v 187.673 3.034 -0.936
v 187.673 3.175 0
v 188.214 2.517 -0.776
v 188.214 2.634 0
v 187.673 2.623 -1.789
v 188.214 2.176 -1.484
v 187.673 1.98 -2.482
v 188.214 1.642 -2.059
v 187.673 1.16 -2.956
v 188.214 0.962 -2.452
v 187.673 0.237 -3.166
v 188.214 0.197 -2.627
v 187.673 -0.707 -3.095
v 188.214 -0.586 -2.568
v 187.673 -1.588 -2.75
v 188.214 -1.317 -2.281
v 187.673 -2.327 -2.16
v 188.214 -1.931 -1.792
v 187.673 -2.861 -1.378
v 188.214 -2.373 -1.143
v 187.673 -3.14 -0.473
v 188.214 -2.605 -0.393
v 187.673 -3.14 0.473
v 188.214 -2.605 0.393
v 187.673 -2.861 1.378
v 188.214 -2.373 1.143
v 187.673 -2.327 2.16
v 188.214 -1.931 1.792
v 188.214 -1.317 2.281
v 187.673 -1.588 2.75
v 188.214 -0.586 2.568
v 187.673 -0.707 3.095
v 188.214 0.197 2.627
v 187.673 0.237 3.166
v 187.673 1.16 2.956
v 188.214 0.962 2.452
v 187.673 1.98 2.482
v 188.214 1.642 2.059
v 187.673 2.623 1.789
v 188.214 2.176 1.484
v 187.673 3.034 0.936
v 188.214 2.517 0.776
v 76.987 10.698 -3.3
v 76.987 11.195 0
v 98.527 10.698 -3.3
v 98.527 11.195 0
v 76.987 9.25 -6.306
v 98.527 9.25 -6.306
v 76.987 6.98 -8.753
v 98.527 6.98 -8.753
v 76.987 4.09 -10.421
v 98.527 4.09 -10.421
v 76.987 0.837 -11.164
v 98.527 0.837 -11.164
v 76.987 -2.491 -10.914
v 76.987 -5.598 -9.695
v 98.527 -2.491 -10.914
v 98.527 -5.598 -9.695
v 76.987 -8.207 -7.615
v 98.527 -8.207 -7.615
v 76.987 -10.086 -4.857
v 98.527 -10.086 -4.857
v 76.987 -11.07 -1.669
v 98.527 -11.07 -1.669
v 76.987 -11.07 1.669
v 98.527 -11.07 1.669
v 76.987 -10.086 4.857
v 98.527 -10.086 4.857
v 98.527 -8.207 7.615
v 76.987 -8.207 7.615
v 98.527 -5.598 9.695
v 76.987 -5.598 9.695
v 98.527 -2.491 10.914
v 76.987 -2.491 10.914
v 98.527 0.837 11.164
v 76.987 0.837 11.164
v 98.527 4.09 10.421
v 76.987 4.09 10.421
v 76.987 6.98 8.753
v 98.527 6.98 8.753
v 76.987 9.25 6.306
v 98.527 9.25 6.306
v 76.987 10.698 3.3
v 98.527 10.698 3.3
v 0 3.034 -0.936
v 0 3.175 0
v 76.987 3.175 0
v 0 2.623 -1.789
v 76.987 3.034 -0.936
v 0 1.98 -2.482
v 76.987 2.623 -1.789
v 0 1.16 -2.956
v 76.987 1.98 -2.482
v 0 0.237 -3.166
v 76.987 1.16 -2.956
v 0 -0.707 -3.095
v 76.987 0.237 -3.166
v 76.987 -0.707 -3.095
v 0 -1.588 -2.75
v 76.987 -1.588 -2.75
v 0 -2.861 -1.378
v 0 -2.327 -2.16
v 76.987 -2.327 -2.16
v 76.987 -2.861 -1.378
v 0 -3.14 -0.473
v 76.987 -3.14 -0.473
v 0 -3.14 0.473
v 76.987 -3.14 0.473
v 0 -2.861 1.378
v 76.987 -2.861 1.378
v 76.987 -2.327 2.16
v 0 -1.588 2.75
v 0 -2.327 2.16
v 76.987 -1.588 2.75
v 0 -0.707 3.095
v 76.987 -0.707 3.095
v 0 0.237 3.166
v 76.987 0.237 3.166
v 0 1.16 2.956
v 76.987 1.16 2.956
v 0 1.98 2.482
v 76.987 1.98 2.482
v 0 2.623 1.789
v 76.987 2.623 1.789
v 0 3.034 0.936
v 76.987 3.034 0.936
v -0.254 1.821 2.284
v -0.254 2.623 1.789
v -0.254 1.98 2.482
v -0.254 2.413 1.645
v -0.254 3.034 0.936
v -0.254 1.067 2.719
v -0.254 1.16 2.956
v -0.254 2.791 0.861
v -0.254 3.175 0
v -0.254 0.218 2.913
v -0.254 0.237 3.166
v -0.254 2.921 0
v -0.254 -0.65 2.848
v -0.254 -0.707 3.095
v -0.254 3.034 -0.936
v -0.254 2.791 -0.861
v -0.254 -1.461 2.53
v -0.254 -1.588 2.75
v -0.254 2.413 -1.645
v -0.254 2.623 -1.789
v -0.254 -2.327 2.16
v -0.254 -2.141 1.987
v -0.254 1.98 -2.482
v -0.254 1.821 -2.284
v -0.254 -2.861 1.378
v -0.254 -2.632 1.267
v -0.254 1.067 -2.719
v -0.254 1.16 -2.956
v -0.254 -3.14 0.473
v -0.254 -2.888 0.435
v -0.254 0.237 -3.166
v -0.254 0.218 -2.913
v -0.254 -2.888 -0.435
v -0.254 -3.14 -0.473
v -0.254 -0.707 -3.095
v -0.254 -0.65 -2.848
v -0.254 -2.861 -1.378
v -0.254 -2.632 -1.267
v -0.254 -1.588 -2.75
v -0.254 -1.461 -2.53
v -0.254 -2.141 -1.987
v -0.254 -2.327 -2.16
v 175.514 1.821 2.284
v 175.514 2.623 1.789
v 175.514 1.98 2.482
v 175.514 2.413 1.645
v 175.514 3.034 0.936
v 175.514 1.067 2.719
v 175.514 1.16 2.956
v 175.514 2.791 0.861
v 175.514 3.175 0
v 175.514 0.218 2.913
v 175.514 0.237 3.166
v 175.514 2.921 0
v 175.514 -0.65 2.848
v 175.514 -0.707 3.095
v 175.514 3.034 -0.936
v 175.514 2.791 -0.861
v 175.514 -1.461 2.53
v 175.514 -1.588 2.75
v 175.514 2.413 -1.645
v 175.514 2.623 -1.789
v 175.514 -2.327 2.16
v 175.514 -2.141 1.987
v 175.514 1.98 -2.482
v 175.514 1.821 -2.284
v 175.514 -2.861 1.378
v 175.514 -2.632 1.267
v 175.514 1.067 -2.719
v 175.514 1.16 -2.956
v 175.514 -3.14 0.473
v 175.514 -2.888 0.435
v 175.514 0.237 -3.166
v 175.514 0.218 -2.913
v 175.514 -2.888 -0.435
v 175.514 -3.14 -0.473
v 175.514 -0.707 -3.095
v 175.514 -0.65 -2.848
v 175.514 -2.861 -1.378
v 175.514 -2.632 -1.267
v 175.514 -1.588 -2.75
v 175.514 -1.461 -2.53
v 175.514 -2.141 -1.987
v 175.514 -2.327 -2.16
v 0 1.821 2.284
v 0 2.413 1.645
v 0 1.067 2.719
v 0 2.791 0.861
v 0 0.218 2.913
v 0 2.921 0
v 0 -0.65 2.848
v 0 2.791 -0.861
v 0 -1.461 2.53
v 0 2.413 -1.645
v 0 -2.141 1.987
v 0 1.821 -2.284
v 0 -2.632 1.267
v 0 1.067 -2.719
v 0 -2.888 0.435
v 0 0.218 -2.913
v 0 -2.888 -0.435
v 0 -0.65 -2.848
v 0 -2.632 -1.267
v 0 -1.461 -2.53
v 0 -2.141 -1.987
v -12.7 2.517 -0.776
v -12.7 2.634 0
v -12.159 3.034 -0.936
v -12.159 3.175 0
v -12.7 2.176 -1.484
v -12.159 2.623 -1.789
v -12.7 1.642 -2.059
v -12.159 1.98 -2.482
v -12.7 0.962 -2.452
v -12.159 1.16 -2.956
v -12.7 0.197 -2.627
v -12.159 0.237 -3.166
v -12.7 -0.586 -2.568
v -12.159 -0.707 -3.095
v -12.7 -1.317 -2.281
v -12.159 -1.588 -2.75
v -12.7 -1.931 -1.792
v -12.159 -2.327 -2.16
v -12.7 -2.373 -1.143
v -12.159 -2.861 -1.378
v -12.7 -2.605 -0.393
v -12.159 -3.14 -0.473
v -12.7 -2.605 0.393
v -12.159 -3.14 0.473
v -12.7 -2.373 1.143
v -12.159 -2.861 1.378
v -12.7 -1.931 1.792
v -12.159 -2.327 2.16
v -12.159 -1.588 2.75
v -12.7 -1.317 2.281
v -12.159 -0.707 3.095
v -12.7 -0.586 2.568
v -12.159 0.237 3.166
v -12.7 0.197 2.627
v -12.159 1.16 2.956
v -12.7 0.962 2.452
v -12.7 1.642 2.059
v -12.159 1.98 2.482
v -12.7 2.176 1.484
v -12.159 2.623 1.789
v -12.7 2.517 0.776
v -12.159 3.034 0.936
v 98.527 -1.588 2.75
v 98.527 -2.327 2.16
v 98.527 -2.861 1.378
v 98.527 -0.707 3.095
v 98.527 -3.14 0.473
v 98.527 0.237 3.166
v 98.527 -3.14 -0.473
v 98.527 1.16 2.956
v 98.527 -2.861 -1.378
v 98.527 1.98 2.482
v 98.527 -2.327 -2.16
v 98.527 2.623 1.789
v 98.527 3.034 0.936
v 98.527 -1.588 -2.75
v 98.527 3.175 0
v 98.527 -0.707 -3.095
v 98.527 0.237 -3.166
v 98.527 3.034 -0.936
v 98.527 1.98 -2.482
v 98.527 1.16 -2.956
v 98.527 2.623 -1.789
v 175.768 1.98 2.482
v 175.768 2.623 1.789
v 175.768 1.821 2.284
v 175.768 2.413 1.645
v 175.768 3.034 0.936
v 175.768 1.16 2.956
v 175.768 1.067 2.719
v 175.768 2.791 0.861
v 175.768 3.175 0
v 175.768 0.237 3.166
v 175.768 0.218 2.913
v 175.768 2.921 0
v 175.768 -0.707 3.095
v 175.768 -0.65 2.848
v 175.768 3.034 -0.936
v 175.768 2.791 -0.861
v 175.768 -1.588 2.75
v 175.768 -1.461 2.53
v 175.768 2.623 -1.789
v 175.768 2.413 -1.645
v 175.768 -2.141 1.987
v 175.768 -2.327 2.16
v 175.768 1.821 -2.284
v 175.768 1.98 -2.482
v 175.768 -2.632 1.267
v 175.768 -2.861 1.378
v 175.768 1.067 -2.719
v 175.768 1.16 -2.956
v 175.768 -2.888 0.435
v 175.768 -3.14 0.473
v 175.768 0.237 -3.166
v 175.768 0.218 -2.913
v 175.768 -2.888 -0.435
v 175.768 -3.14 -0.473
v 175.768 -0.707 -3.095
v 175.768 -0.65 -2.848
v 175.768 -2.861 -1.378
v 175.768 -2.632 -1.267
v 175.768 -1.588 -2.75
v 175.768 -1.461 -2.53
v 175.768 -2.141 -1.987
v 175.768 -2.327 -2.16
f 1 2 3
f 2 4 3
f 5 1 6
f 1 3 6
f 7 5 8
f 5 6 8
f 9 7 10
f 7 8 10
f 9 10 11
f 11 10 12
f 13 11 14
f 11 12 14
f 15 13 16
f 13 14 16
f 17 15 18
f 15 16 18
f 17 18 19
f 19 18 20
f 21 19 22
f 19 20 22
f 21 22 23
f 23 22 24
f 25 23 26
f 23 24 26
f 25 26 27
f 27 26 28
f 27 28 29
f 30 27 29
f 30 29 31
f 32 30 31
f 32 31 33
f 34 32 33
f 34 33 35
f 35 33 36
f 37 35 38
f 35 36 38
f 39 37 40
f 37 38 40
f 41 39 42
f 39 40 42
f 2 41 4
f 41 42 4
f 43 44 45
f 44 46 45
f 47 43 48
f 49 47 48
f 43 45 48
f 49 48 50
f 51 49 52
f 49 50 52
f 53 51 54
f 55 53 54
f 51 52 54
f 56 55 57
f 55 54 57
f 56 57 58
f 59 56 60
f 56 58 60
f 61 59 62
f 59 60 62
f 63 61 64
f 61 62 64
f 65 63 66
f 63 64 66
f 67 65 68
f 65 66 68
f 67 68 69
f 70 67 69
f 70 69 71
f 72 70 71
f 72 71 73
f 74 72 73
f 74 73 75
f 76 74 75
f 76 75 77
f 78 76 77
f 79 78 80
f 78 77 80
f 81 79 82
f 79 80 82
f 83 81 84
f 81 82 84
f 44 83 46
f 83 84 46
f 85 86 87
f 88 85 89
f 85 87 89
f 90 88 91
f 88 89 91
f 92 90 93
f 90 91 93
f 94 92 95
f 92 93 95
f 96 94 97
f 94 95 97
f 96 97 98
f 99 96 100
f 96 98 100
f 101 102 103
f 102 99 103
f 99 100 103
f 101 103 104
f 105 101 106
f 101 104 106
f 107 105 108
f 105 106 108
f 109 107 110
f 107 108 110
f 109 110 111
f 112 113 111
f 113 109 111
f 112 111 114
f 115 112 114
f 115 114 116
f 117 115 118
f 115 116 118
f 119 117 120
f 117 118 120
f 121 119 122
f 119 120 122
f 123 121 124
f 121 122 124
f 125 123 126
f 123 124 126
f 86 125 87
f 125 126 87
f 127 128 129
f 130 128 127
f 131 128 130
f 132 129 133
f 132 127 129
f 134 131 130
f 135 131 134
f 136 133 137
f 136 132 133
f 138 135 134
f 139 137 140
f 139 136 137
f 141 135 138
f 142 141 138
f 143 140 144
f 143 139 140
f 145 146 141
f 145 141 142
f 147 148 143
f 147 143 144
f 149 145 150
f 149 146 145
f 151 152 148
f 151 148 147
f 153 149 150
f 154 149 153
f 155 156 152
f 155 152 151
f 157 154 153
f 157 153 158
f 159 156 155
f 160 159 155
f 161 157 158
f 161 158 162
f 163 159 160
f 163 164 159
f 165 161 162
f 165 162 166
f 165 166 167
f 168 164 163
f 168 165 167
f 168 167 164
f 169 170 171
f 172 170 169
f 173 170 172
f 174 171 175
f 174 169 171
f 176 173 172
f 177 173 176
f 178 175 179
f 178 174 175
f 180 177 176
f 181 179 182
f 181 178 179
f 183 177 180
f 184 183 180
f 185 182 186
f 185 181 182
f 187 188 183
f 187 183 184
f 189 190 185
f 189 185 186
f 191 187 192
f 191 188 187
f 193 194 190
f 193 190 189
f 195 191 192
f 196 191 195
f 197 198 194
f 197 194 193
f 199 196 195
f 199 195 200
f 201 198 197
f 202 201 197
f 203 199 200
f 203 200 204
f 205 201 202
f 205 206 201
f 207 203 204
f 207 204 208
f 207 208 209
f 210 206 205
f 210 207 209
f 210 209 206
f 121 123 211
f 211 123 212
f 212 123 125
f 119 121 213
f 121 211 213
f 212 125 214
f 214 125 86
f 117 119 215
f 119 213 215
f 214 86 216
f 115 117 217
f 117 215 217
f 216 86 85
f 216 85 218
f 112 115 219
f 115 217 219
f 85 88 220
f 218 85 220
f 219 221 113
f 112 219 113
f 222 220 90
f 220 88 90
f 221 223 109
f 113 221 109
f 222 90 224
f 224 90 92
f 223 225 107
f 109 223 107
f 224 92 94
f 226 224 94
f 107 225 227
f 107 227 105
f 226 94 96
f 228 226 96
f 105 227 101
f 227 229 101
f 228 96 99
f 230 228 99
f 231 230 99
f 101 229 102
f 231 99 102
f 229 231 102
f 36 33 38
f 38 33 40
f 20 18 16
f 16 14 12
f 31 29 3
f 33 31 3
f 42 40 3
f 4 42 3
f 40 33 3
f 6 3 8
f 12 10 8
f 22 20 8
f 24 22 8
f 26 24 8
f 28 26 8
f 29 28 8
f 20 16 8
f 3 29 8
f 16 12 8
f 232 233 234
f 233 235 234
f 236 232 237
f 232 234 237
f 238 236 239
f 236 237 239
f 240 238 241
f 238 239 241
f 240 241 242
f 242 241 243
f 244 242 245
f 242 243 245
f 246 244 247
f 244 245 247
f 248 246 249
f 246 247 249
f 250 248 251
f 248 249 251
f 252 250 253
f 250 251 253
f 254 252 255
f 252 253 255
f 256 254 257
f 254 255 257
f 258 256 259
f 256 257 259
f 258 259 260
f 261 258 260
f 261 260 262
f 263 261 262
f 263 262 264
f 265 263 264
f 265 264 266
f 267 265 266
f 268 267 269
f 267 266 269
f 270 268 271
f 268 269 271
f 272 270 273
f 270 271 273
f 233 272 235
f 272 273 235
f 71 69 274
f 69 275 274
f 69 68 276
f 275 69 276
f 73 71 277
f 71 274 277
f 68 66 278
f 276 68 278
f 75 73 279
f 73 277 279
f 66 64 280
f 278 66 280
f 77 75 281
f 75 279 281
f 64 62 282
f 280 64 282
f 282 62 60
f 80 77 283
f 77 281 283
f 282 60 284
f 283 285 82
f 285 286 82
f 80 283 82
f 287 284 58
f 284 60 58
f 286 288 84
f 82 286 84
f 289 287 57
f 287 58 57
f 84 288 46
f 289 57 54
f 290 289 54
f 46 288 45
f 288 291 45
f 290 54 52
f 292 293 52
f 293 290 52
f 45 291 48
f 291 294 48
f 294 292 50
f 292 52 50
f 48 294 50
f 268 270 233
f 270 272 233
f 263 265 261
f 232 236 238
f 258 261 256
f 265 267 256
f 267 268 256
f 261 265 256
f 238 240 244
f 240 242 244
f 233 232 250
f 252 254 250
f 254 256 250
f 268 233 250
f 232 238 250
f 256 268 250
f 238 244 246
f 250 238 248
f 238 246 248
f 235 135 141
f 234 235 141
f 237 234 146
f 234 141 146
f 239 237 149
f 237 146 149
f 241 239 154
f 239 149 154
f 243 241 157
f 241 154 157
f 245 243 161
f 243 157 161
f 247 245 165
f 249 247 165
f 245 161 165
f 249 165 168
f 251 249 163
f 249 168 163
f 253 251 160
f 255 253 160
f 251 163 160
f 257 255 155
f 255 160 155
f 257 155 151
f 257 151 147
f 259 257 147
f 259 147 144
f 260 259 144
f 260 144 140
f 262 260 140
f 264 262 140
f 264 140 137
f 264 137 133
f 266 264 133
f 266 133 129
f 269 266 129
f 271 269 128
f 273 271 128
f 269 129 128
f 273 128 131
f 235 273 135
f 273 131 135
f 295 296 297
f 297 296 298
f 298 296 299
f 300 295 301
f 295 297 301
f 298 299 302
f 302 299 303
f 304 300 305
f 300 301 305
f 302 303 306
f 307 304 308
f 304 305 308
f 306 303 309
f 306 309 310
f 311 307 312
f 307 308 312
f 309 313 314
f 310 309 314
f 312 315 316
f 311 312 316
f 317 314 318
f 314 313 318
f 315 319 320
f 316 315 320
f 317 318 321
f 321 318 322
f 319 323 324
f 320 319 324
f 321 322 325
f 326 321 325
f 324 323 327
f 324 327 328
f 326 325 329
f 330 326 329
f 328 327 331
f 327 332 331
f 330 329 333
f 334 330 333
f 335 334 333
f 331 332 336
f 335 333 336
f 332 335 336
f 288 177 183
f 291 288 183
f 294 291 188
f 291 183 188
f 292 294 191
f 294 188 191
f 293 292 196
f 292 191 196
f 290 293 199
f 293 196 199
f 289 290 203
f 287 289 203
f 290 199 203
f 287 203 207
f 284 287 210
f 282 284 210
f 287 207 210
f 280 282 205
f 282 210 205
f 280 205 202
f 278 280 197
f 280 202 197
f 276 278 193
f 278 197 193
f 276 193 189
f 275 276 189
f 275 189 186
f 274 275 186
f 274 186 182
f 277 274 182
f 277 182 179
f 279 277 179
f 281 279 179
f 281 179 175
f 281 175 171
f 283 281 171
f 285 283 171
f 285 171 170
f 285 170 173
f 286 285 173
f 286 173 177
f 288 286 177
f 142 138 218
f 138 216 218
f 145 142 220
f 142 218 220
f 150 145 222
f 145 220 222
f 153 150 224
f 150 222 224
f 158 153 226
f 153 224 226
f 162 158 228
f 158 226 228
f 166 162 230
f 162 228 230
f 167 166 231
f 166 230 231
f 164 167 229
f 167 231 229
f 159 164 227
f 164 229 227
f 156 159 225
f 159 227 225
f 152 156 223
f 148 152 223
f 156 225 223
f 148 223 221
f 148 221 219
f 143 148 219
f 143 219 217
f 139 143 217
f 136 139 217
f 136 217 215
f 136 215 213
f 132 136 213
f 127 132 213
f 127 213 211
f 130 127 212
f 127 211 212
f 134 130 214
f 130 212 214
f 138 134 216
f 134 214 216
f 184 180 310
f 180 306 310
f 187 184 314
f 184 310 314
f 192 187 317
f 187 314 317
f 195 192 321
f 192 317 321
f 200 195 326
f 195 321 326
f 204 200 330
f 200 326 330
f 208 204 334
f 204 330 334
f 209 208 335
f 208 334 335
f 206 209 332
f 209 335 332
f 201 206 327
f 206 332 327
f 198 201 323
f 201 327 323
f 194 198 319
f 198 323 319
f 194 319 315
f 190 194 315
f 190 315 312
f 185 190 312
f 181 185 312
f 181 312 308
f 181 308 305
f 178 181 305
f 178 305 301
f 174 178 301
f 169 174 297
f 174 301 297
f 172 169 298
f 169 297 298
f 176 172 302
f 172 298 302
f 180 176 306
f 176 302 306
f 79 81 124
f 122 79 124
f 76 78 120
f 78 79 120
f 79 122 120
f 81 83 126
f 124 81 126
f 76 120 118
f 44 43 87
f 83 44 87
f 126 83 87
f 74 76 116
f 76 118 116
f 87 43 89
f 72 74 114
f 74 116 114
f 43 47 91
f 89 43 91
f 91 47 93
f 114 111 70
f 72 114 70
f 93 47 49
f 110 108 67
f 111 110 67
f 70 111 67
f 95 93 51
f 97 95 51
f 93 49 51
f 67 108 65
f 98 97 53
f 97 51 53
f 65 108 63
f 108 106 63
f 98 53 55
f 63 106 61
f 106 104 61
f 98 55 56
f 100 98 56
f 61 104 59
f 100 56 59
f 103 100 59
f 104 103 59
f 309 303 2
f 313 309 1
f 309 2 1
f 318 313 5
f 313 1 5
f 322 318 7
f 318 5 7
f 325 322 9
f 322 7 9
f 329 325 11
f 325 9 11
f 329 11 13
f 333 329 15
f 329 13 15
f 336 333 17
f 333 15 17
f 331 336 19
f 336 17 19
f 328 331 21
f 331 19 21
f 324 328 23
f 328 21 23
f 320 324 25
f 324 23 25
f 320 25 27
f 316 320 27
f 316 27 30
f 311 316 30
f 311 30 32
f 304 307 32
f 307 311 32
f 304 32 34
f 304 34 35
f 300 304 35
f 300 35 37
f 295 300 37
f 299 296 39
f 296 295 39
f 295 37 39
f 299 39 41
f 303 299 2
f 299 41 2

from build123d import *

# Parameters (mm, degrees)
SKETCH3_W = 76.9874
SKETCH3_H = 3.175
SKETCH5_W = 0.254
SKETCH5_H = 0.508
SKETCH6_W = 0.254
SKETCH6_H = 0.508


with BuildPart() as part:
    # Sketch1 → Revolve1 (revolve)
    with BuildSketch(Plane.XY):
        Polygon((0, 0), (0, 3.175), (76.9874, 3.175), (76.9874, 11.19505), (98.5266, 11.19505), (98.5266, 0), align=None)
    revolve(axis=Axis((98.5266, 0, 0), (-1, 0, 0)))

    # Sketch2 → Revolve2 (revolve)
    with BuildSketch(Plane.XY):
        Polygon((-12.7, 0), (-12.7, 2.63398), (-12.15898, 3.175), (0, 3.175), (0, 0), align=None)
    revolve(axis=Axis((0, 0, 0), (-1, 0, 0)))

    # Sketch3 → Revolve3 (revolve)
    with BuildSketch(Plane.XY):
        with Locations((137.0203, 1.5875)):
            Rectangle(SKETCH3_W, SKETCH3_H)
    revolve(axis=Axis((175.514, 0, 0), (-1, 0, 0)))

    # Sketch4 → Revolve4 (revolve)
    with BuildSketch(Plane.XY):
        Polygon((175.514, 0), (175.514, 3.175), (187.67298, 3.175), (188.214, 2.63398), (188.214, 0), align=None)
    revolve(axis=Axis((188.214, 0, 0), (-1, 0, 0)))

    # Sketch5 → Cut-Revolve1 (revolve, cut)
    with BuildSketch(Plane.XY):
        with Locations((-0.127, 3.175)):
            Rectangle(SKETCH5_W, SKETCH5_H)
    revolve(axis=Axis((0, 0, 0), (-1, 0, 0)), mode=Mode.SUBTRACT)

    # Sketch6 → Cut-Revolve2 (revolve, cut)
    with BuildSketch(Plane.XY):
        with Locations((175.641, 3.175)):
            Rectangle(SKETCH6_W, SKETCH6_H)
    revolve(axis=Axis((175.768, 0, 0), (-1, 0, 0)), mode=Mode.SUBTRACT)


solid = part.part
